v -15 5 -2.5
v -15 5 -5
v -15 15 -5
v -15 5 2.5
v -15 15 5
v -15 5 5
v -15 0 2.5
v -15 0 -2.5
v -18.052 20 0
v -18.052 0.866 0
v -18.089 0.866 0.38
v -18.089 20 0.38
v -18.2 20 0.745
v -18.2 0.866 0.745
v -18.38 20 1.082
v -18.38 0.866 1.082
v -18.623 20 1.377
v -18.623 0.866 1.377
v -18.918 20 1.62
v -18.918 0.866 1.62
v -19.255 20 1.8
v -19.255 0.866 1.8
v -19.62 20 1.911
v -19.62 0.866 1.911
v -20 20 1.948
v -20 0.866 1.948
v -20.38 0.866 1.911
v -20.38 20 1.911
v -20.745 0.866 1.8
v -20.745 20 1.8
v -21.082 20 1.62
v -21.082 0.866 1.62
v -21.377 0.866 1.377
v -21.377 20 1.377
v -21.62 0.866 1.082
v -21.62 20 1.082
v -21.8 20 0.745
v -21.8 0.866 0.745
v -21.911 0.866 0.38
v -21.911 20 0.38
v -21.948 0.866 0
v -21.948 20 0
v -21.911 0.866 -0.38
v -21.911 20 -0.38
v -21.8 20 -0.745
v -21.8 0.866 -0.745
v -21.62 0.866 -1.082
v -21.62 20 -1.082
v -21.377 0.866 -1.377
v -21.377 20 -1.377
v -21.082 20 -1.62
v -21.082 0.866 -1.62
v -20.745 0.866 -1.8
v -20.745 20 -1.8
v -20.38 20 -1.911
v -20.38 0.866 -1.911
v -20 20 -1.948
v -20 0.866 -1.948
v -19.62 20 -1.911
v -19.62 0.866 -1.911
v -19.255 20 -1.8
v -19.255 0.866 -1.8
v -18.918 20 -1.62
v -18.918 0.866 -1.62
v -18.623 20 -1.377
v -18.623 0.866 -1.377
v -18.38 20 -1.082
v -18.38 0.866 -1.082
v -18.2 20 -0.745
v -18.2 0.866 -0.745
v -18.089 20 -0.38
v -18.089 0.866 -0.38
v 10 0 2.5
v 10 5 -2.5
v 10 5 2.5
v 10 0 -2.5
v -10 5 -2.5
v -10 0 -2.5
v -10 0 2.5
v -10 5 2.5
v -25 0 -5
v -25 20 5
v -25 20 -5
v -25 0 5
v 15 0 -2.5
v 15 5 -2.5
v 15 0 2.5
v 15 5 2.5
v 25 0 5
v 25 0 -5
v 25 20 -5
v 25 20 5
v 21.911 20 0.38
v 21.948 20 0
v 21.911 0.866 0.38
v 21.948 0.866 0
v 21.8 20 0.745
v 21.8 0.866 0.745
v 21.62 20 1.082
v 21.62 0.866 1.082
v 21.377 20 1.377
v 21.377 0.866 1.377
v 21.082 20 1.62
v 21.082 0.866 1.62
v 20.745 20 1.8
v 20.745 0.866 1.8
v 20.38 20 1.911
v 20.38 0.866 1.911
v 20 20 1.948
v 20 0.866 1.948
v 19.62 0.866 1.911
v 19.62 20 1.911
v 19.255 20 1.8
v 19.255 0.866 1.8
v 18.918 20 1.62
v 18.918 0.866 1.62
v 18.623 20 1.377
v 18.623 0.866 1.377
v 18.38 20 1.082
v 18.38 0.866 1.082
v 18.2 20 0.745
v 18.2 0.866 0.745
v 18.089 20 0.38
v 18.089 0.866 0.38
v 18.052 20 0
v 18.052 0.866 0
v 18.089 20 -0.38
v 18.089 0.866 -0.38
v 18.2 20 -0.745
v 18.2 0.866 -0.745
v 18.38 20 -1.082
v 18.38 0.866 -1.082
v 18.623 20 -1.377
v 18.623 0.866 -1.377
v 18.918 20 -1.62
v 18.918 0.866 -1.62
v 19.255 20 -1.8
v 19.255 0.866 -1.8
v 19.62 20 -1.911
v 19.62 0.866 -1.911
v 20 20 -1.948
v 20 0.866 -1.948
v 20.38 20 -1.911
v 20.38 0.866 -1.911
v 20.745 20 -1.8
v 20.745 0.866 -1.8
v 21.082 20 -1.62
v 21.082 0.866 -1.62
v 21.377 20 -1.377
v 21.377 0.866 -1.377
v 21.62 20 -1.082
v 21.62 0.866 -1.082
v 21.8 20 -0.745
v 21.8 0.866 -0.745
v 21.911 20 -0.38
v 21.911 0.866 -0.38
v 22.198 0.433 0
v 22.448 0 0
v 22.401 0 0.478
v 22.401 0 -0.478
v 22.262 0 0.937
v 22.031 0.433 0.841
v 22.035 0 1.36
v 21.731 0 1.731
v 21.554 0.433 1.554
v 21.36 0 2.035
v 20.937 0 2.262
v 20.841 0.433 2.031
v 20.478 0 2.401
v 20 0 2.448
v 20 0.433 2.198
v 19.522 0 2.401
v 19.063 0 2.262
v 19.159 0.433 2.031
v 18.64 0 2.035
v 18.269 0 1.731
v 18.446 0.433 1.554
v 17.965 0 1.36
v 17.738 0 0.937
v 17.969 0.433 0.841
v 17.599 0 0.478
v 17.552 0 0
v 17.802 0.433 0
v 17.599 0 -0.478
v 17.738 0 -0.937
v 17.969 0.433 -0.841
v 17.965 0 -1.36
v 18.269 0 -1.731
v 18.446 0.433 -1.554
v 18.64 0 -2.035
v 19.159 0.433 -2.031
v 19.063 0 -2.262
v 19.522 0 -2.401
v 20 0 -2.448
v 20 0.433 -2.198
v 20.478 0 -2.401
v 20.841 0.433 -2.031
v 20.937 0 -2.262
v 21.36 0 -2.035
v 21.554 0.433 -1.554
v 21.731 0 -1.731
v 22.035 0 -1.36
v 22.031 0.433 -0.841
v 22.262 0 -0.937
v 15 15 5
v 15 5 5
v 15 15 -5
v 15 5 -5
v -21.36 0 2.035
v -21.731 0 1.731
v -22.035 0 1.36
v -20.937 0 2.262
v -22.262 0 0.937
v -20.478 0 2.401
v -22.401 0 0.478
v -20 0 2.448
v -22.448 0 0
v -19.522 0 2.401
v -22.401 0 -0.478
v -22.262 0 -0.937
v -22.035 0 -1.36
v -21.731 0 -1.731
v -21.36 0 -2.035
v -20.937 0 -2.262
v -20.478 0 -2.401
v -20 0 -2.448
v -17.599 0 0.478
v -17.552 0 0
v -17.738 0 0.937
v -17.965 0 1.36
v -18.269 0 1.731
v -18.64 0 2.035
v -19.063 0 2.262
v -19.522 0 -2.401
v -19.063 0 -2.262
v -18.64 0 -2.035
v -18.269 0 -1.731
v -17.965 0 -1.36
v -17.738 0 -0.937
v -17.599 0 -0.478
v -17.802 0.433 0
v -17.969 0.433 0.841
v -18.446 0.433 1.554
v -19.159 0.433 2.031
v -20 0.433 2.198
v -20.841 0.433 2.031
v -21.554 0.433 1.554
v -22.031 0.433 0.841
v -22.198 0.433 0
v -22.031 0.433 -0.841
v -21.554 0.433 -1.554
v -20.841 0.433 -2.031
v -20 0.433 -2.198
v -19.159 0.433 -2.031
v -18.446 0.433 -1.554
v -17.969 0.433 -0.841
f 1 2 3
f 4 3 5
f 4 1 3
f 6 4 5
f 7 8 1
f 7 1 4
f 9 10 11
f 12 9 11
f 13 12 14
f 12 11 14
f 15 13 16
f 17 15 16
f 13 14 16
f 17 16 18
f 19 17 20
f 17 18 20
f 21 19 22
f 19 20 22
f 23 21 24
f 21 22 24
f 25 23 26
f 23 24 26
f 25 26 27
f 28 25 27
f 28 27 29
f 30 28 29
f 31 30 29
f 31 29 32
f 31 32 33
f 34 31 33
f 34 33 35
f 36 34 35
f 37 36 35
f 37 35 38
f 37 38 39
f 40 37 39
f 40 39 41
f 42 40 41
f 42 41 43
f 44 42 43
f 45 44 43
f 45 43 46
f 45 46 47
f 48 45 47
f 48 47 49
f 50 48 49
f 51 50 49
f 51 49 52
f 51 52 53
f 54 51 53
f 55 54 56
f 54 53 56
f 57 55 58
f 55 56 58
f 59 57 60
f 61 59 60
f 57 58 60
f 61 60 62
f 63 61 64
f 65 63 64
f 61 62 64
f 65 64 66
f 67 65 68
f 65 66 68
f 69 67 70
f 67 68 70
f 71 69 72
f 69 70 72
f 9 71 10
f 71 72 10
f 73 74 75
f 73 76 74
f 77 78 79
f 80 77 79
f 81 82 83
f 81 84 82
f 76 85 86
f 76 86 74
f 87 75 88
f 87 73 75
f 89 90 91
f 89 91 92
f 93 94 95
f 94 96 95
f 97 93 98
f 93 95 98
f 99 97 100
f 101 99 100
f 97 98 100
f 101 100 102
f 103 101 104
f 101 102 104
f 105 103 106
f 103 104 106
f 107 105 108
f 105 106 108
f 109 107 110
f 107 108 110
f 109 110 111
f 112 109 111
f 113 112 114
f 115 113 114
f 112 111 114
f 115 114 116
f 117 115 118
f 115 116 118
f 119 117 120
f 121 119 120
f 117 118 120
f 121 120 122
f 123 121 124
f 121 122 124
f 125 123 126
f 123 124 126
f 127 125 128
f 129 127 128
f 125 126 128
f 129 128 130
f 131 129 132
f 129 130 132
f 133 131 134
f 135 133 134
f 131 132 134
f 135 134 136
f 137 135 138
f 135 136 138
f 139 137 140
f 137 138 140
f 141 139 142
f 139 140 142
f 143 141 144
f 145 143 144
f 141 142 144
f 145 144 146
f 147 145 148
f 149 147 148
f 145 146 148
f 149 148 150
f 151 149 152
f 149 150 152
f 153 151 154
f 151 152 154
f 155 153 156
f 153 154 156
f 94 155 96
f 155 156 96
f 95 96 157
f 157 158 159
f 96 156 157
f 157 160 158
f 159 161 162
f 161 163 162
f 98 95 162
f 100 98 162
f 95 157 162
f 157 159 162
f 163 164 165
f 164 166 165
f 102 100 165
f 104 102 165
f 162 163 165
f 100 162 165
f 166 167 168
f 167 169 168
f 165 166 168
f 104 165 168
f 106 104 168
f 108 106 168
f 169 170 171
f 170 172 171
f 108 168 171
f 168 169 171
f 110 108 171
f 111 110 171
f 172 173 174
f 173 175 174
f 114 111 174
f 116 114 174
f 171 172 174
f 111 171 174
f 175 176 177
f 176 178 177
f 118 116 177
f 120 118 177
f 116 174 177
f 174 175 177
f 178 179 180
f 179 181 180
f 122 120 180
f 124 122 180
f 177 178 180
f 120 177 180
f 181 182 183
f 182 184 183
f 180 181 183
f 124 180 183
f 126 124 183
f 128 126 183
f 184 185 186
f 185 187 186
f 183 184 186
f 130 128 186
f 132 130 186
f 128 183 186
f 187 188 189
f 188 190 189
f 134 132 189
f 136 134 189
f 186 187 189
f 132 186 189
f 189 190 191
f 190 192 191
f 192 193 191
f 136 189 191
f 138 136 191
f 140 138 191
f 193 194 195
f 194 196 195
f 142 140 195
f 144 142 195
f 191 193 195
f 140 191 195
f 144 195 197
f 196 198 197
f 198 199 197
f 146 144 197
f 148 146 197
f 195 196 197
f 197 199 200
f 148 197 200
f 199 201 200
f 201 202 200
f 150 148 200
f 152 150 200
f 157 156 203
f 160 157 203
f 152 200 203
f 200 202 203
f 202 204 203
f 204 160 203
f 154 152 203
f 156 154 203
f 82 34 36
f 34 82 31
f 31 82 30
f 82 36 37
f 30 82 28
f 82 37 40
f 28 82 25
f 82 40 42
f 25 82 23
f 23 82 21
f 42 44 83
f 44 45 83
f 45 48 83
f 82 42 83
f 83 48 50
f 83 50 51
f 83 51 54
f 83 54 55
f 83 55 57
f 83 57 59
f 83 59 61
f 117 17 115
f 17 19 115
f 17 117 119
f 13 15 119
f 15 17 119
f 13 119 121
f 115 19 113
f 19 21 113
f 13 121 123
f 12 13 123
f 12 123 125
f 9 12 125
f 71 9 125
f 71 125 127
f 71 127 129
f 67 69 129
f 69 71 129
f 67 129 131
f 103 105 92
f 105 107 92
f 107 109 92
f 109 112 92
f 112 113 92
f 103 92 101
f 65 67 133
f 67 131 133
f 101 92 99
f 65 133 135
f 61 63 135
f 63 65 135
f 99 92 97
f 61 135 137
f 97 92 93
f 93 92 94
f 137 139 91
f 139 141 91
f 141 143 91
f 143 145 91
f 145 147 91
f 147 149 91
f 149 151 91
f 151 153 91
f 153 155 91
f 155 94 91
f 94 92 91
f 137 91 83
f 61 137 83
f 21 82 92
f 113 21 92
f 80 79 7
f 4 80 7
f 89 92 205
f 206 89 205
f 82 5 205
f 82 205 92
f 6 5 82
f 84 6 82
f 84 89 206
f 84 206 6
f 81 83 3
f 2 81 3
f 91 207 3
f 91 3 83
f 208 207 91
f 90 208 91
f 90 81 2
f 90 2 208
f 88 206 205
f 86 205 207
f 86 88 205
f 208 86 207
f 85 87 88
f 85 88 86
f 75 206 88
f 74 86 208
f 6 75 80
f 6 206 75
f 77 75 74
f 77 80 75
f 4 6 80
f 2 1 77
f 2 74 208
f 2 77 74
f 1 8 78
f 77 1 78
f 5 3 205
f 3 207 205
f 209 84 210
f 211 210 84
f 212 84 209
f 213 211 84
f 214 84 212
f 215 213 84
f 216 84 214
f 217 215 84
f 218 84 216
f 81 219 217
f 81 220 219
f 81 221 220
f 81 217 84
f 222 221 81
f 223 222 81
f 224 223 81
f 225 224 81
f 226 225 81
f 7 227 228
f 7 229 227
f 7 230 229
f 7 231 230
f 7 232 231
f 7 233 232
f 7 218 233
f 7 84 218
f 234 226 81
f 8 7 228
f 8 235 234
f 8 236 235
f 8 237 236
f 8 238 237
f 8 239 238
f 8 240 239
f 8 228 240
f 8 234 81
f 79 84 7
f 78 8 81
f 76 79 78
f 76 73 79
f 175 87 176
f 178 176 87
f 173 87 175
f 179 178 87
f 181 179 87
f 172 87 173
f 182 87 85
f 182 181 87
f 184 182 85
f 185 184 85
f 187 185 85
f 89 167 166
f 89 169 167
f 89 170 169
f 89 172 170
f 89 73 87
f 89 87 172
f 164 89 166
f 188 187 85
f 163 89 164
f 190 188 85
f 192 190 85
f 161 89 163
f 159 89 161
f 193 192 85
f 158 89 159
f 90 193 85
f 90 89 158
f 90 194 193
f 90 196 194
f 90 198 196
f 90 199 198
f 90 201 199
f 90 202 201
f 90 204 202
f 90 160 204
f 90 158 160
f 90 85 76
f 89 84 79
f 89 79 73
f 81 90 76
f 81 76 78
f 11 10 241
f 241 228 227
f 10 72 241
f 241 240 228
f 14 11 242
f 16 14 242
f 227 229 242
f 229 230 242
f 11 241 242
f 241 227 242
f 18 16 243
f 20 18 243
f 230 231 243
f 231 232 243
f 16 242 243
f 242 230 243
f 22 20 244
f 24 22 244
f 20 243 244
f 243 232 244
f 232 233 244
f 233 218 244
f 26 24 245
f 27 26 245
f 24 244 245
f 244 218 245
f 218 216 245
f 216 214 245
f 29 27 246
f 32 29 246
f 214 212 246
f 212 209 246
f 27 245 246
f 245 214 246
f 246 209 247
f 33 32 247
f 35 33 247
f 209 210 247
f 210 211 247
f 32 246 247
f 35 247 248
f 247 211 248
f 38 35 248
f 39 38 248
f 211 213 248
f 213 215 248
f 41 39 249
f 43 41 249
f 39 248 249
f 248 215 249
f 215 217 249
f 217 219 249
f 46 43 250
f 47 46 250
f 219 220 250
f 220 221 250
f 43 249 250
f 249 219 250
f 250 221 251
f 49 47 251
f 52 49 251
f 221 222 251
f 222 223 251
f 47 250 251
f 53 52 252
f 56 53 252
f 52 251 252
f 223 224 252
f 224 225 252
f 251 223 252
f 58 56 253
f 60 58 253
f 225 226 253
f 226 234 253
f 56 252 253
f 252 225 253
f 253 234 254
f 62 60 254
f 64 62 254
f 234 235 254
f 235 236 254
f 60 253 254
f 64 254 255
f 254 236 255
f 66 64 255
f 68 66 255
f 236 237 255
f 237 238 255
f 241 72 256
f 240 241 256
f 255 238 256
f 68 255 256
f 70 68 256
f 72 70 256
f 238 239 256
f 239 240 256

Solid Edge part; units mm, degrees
sketch "Sketch1" plane through (0, 0, 0) normal (0, -1, 0) x (1, 0, 0)
  line L0 (-25, -5) -> (25, -5)
  line L1 (25, -5) -> (25, 5)
  line L2 (25, 5) -> (-25, 5)
  line L3 (-25, 5) -> (-25, -5)
  dimension "D1" = 50
  dimension "D2" = 5
extrude "Protrusion1" add sketch "Sketch1" against normal blind 20
sketch "Sketch2" plane through (0, 0, 0) normal (0, -1, 0) x (1, 0, 0)
  circle A0 centre (-20, 0) radius 1.948
  circle A1 centre (20, 0) radius 1.948
  dimension "D1" = 40
  dimension "D2" = 5
extrude "Cutout1" cut sketch "Sketch2" against normal through all
sketch "Sketch3" plane through (0, 0, 0) normal (0, -1, 0) x (1, 0, 0)
  line L0 (-15, 5) -> (15, 5)
  line L1 (15, 5) -> (15, -5)
  line L2 (15, -5) -> (-15, -5)
  line L3 (-15, -5) -> (-15, 5)
  dimension "D1" = 10
  dimension "D2" = 10
extrude "Extrusionsausschnitt_3" cut sketch "Sketch3" against normal blind 15
sketch "Sketch4" plane through (-15, 7.5, 0) normal (1, 0, 0) x (0, 1, 0)
  line L0 (-7.5, 5) -> (-2.5, 5)
  line L1 (-2.5, 5) -> (-2.5, -5)
  line L2 (-2.5, -5) -> (-7.5, -5)
  line L3 (-7.5, -5) -> (-7.5, 5)
  dimension "D1" = 5
extrude "Extrusionsausprägung_2" add sketch "Sketch4" along normal blind 30
sketch "Sketch5" plane through (0, 0, 0) normal (0, -1, 0) x (1, 0, 0)
  line L0 (-15, -2.5) -> (-10, -2.5)
  line L1 (-10, -2.5) -> (-10, 2.5)
  line L2 (-10, 2.5) -> (-15, 2.5)
  line L3 (-15, 2.5) -> (-15, -2.5)
  line L4 (15, -2.5) -> (10, -2.5)
  line L5 (10, -2.5) -> (10, 2.5)
  line L6 (10, 2.5) -> (15, 2.5)
  line L7 (15, 2.5) -> (15, -2.5)
  dimension "D1" = 5
  dimension "D2" = 5
  dimension "D3" = 5
extrude "Cutout2" cut sketch "Sketch5" against normal up to next
chamfer "Fase_1" distance 0.5 angle 60 2 edges at (-21.948, 0, 0) (18.052, 0, 0) measured on face at (-16.1667, 0, 3.4333)
properties material "Nylon, allgemein"
